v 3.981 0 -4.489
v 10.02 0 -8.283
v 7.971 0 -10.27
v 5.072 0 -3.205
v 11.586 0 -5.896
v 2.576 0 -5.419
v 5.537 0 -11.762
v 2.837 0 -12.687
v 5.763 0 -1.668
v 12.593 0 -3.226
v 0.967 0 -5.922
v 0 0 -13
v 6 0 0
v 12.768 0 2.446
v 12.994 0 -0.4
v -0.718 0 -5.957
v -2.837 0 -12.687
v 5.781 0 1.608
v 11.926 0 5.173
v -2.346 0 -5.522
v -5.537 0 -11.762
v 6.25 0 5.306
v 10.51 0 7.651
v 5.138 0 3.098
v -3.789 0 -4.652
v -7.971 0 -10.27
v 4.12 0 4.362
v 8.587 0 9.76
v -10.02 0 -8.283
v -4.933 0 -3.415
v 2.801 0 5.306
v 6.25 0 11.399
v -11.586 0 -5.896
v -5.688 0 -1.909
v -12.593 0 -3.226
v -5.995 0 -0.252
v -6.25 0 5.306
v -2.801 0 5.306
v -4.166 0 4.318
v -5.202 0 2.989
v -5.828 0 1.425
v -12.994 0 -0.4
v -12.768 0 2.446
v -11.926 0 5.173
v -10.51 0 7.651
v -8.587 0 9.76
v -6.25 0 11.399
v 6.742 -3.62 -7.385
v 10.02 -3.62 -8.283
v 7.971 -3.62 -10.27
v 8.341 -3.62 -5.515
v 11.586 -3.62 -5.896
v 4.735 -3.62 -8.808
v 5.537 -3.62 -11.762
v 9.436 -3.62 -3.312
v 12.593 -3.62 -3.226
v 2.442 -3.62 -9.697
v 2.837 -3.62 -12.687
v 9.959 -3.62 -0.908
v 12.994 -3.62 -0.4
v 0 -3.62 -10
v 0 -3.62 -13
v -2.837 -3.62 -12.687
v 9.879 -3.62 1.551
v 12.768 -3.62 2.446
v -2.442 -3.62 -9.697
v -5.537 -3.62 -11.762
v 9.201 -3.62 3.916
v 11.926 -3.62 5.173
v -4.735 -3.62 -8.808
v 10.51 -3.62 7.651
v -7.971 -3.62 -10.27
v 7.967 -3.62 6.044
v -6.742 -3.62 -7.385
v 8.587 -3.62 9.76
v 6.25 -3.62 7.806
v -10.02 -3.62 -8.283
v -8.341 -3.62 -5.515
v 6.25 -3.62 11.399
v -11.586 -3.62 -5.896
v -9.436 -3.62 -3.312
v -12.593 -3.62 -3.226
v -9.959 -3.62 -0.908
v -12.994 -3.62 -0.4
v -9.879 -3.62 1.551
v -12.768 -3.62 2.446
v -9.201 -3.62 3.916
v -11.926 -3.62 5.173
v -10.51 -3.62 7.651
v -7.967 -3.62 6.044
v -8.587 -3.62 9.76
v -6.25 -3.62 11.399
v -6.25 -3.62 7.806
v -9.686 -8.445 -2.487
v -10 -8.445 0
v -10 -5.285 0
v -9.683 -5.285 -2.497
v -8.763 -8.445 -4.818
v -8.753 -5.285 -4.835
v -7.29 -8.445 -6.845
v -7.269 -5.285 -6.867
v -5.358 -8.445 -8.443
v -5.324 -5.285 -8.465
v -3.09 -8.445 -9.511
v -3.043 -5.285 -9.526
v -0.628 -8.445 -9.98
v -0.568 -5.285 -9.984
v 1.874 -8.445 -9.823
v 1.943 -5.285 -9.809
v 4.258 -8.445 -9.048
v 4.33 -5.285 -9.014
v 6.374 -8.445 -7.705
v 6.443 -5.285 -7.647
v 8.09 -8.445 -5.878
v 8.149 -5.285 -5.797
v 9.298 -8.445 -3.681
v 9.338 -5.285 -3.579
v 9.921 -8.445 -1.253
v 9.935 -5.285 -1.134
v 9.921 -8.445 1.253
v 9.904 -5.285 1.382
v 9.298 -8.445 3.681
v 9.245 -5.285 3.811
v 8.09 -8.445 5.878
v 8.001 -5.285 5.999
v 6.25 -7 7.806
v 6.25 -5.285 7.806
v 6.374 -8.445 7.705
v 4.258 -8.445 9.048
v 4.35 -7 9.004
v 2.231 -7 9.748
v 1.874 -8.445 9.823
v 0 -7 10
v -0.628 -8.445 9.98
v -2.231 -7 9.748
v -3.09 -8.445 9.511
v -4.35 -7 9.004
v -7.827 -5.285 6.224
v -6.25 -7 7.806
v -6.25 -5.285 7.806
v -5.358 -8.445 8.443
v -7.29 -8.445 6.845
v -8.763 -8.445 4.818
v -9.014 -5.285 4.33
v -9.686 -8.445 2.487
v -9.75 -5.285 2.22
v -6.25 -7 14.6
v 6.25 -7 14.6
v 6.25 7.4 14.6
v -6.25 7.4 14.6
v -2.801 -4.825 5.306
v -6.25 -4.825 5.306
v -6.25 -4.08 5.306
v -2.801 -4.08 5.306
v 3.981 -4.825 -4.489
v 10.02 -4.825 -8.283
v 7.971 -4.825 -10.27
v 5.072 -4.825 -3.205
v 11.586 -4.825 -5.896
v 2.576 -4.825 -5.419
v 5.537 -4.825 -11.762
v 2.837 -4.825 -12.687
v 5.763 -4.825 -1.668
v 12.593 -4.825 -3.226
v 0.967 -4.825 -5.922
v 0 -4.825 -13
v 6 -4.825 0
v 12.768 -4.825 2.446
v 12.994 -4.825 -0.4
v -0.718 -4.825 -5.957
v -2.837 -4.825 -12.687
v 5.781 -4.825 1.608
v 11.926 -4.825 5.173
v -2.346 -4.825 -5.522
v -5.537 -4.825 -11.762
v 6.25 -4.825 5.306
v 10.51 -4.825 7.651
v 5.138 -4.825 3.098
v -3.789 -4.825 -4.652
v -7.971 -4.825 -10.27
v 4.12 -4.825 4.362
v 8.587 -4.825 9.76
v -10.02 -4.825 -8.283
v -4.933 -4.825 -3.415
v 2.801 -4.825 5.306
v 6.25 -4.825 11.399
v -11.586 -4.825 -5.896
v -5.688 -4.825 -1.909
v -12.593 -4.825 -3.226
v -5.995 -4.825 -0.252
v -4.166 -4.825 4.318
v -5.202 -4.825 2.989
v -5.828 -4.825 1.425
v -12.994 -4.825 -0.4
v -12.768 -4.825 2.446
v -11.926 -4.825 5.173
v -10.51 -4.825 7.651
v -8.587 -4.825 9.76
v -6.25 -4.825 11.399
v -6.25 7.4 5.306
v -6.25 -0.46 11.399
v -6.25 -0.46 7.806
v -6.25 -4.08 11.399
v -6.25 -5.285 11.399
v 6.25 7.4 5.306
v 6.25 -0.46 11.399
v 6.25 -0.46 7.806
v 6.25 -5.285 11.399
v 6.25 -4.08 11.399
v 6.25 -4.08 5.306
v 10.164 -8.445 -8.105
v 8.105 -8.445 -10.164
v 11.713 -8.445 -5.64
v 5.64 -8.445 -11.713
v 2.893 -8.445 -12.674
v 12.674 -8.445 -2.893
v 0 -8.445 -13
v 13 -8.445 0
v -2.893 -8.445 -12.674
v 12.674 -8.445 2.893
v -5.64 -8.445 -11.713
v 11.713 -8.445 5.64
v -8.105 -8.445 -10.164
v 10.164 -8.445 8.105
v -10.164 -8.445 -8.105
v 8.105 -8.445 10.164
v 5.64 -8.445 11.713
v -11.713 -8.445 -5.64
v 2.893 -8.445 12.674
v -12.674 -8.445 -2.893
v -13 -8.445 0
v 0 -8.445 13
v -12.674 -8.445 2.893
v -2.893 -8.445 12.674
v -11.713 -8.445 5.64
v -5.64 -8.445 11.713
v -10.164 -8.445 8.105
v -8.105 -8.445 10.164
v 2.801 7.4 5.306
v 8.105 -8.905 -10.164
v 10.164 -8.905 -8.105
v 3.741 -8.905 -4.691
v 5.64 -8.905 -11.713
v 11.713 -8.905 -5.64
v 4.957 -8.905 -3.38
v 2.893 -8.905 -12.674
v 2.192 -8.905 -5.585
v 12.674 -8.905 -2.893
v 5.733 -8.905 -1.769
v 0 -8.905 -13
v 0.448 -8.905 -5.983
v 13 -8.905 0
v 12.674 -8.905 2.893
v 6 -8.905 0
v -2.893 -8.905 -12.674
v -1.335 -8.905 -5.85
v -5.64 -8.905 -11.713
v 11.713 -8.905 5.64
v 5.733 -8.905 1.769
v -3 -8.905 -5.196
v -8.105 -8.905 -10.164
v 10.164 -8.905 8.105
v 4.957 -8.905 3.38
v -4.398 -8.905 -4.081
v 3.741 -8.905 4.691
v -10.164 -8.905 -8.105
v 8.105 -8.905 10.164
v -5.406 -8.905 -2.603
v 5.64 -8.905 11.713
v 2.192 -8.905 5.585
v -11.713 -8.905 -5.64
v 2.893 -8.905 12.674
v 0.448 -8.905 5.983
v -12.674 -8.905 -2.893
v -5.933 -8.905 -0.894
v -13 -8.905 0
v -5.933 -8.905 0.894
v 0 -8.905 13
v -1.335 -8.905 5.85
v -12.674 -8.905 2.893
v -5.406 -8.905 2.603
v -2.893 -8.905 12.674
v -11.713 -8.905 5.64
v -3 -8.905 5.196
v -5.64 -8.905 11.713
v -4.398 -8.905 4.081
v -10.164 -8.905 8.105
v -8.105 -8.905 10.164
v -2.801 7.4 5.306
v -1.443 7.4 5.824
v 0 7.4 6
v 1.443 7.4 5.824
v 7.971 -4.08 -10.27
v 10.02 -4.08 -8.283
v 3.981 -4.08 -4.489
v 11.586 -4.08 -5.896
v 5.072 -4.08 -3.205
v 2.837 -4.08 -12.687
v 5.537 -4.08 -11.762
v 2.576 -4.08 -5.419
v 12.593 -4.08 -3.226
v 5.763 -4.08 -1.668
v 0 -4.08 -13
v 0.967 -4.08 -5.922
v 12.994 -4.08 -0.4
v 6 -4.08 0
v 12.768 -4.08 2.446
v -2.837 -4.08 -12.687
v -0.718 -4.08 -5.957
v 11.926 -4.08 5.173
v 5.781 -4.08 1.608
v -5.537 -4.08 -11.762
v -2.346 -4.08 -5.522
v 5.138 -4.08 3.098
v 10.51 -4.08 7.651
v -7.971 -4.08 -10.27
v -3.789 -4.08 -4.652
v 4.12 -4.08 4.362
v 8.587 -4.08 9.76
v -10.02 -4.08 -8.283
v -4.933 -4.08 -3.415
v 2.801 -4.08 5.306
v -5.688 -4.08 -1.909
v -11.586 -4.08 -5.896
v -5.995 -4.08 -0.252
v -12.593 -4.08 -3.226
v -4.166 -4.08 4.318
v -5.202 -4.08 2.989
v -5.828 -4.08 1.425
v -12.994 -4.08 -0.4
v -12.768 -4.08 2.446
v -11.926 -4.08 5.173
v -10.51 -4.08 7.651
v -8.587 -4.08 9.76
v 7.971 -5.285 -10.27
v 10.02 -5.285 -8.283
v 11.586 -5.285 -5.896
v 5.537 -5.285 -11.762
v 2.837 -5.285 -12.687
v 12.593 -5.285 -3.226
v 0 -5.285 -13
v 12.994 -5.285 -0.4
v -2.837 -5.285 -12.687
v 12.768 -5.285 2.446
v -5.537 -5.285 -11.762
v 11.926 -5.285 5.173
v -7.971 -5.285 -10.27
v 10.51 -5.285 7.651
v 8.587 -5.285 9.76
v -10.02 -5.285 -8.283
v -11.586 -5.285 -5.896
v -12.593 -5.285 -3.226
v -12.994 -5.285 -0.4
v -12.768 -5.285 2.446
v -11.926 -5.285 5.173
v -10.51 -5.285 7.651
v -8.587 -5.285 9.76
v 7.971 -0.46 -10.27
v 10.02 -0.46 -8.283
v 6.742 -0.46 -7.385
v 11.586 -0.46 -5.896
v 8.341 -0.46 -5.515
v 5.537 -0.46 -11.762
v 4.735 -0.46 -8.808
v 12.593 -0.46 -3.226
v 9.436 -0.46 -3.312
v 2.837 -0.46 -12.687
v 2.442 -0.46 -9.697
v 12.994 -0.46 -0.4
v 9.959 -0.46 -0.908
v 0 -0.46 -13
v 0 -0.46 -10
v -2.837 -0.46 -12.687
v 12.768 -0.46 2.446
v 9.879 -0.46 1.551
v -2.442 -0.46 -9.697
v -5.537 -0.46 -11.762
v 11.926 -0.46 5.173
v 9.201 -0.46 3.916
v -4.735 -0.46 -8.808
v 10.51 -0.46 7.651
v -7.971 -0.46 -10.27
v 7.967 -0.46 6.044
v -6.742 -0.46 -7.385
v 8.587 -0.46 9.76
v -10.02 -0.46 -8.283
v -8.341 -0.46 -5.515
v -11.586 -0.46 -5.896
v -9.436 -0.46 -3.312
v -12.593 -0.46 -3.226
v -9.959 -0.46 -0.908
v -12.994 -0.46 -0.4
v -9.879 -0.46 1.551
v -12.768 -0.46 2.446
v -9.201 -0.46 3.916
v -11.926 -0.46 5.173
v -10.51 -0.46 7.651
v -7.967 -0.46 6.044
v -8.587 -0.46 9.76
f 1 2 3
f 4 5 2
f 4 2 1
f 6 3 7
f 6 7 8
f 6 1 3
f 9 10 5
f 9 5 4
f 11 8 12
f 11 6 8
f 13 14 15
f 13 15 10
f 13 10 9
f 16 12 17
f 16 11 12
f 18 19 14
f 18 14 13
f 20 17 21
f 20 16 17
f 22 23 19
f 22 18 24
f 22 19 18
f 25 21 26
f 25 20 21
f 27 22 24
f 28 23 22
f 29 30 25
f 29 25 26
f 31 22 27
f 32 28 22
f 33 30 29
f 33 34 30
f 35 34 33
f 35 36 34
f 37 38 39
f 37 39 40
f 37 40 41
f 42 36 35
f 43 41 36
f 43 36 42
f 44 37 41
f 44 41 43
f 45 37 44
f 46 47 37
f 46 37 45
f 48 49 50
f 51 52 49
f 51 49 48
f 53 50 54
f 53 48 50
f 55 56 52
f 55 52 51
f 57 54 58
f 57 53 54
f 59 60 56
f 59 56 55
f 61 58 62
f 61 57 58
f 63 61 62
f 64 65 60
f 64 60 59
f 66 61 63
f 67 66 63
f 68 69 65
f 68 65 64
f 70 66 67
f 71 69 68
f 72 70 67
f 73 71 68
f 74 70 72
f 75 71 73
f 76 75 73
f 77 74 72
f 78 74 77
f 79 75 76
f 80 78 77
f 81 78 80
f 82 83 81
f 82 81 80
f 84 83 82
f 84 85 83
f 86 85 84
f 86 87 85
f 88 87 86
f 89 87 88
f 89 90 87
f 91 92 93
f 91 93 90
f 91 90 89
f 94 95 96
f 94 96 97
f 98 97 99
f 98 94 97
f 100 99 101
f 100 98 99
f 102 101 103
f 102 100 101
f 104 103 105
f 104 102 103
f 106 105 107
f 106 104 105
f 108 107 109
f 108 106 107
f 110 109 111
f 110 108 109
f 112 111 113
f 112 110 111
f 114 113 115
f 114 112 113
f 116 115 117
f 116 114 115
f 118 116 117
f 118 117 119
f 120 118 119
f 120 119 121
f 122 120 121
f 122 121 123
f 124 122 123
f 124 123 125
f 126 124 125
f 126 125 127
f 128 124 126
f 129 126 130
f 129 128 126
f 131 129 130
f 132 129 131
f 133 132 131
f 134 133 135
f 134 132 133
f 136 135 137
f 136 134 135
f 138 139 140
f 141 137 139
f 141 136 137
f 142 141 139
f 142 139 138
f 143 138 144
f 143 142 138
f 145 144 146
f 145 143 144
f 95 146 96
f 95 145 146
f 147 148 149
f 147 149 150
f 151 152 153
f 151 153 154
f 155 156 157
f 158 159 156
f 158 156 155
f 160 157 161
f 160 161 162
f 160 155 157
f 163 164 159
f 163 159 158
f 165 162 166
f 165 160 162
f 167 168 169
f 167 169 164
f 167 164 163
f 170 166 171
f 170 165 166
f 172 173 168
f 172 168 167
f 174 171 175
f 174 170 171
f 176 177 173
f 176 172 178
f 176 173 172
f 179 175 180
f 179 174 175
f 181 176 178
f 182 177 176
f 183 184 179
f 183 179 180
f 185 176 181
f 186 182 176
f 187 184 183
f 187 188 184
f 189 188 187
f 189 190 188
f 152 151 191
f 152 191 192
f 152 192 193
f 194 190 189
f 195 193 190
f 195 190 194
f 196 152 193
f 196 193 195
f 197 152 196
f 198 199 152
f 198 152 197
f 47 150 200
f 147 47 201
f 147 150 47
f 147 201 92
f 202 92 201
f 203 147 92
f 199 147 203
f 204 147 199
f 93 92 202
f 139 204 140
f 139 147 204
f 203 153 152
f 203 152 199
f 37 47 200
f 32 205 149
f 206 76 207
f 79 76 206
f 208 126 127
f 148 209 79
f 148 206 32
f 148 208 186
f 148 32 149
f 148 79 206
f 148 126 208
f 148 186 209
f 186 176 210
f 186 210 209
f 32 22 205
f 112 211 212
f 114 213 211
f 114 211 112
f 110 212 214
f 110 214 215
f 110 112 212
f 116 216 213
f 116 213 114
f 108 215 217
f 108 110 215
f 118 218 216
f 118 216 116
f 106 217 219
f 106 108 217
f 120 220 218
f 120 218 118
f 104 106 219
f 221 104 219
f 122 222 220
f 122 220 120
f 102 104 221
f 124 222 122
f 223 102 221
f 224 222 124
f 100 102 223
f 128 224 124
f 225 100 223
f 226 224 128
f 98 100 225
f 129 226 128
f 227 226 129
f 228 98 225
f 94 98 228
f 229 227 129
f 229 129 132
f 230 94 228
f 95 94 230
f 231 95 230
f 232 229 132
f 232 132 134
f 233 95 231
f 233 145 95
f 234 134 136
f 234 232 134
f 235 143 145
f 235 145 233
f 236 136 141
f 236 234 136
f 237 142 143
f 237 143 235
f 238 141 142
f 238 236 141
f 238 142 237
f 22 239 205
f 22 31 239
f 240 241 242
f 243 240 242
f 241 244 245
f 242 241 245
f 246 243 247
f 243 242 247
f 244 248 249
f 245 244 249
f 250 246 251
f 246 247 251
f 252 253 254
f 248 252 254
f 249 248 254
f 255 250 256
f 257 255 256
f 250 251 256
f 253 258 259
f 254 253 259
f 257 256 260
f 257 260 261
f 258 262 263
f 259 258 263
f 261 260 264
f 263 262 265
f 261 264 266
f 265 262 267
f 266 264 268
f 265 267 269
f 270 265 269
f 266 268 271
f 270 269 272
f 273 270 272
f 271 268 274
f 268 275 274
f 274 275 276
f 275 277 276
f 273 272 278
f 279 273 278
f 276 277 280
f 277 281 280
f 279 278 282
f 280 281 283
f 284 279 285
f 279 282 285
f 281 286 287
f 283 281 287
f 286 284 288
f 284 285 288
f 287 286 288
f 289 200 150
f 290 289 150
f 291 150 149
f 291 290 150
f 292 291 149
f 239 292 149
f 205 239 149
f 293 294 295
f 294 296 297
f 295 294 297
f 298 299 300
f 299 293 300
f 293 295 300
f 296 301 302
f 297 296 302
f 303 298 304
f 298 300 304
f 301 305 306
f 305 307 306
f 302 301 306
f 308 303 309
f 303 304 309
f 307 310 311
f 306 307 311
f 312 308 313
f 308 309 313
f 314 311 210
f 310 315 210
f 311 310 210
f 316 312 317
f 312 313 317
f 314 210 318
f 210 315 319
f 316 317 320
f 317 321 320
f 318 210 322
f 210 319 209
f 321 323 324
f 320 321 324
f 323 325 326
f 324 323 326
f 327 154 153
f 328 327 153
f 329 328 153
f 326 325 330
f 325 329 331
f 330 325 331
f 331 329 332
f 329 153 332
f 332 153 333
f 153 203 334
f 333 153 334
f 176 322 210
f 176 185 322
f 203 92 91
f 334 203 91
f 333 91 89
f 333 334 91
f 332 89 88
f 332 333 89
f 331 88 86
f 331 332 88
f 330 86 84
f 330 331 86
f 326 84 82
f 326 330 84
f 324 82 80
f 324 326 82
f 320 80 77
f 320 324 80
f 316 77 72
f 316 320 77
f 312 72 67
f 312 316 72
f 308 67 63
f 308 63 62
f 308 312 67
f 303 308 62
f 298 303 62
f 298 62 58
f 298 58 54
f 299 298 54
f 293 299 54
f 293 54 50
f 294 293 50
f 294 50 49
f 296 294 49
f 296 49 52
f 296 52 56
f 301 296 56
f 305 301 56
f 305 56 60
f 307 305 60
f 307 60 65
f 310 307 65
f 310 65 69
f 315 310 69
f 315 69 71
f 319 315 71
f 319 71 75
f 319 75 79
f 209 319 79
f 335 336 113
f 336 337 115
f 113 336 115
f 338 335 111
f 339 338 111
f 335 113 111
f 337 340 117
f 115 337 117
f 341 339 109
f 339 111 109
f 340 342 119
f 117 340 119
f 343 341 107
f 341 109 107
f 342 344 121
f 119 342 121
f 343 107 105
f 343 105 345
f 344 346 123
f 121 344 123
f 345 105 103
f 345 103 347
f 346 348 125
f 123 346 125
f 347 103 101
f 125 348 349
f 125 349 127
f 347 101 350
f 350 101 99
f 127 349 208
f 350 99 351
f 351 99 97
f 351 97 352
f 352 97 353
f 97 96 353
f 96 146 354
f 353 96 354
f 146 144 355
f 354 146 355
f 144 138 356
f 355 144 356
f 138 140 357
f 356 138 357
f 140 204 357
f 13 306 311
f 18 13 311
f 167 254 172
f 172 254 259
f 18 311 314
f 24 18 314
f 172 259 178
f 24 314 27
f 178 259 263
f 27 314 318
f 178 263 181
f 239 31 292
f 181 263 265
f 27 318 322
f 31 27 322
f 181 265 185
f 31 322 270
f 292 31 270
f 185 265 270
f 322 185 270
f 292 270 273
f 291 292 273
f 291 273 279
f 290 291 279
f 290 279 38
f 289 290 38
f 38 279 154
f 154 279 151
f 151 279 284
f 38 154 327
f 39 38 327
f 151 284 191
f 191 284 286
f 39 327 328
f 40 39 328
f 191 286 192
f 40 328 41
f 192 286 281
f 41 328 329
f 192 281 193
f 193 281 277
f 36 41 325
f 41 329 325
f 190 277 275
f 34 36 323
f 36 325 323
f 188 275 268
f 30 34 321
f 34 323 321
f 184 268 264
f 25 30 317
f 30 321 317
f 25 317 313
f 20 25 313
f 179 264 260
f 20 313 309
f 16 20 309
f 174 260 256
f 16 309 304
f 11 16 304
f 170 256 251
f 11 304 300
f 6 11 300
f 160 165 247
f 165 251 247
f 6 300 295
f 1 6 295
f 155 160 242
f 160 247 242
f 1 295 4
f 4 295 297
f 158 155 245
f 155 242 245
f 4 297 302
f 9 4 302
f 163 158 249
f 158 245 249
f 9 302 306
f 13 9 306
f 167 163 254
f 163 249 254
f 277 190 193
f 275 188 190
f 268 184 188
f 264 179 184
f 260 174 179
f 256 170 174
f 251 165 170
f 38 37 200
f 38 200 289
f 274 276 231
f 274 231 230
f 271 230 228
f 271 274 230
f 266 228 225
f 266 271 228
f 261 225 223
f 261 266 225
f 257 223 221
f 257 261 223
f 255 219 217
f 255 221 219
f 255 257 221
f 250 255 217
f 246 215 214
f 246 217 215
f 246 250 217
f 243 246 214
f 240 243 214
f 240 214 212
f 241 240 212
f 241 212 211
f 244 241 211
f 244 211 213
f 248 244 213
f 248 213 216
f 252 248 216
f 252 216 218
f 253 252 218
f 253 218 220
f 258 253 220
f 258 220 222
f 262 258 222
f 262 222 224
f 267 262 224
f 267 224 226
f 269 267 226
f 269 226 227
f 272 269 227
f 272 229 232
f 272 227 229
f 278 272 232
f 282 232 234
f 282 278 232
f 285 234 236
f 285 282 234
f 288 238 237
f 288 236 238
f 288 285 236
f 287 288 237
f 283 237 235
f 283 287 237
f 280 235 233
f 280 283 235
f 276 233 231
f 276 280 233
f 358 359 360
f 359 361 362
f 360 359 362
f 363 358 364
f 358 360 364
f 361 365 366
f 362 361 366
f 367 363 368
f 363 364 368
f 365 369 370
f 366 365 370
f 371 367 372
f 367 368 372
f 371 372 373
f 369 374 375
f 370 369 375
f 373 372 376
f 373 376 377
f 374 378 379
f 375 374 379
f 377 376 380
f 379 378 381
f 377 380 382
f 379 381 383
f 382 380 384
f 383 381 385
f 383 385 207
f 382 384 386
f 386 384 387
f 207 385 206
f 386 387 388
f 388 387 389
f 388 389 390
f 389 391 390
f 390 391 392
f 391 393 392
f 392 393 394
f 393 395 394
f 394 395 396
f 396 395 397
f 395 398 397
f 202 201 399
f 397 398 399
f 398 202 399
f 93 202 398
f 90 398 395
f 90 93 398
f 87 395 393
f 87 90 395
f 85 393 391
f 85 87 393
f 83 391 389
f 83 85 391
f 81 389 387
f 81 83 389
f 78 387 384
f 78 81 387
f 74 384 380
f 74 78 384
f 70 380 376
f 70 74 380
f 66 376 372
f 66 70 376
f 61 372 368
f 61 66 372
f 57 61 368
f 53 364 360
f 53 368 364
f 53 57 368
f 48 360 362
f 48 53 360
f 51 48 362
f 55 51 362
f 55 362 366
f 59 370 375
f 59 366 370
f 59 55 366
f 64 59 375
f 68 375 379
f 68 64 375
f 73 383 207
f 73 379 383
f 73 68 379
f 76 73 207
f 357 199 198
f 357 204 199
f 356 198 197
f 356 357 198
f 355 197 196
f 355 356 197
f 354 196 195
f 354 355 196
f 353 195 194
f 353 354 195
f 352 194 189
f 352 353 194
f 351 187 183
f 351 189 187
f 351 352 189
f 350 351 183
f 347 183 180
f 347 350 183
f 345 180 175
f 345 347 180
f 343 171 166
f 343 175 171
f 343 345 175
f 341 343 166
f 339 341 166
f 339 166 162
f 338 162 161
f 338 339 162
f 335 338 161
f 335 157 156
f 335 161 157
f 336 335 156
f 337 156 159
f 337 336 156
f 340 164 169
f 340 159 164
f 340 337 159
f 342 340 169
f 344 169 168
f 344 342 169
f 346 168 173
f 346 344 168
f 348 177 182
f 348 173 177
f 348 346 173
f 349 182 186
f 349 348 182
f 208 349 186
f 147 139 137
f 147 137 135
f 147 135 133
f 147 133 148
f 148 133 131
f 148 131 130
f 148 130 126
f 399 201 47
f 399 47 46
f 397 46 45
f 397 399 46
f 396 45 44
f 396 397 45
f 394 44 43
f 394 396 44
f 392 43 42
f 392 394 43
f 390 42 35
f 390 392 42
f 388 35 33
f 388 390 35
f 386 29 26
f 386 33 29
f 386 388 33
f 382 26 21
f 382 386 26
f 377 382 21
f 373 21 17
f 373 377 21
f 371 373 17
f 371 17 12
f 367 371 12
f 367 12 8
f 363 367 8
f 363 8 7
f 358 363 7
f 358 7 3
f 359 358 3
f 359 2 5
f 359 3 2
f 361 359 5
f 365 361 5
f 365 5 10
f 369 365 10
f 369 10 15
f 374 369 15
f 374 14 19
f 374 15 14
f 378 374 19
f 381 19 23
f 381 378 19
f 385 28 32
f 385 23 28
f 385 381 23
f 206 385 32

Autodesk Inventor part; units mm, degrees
ref_plane "YZ Plane" through (0, 0, 0) normal (1, 0, 0) x (0, 1, 0)
ref_plane "XZ Plane" through (0, 0, 0) normal (0, 1, 0) x (-1, 0, 0)
ref_plane "XY Plane" through (0, 0, 0) normal (0, 0, 1) x (1, 0, 0)
sketch "Skizze1" plane through (0, 0, 0) normal (0, 0, 1) x (1, 0, 0)
  line L0 (0, 0) -> (-13, 0)
  line L1 (-13, 0) -> (-13, -0.46)
  line L2 (-13, -0.46) -> (-10, -0.46)
  line L3 (-10, -0.46) -> (-10, -3.62)
  line L4 (-10, -3.62) -> (-13, -3.62)
  line L5 (-13, -3.62) -> (-13, -4.08)
  line L6 (-13, -4.08) -> (0, -4.08)
  line L7 (0, -4.08) -> (0, 0)
  line L8 (0, -4.825) -> (-13, -4.825)
  line L9 (-13, -4.825) -> (-13, -5.285)
  line L10 (-13, -5.285) -> (-10, -5.285)
  line L11 (-10, -5.285) -> (-10, -8.445)
  line L12 (-10, -8.445) -> (-13, -8.445)
  line L13 (-13, -8.445) -> (-13, -8.905)
  line L14 (-13, -8.905) -> (0, -8.905)
  line L15 (0, -8.905) -> (0, -4.825)
  dimension "d0" = 13
  dimension "d1" = 0.46
  dimension "d2" = 3
  dimension "d3" = 3.16
  dimension "d4" = 0.46
  dimension "d7" = 4.825
revolve "Umdrehung1" add sketch "Skizze1" angle 360 about axis through (0, -8.905, 0) along (0, 1, 0)
sketch "Skizze2" plane through (0, 0, 0) normal (0, 1, 0) x (1, 0, 0)
  line L0 (6.25, -14.6) -> (-6.25, -14.6)
  line L1 (-6.25, -14.6) -> (-6.25, -5.3061)
  line L2 (-6.25, -5.3061) -> (6.25, -5.3061)
  line L3 (6.25, -5.3061) -> (6.25, -14.6)
  line L4 (6.25, -14.6) -> (-6.25, -5.3061) construction
  line L5 (-6.25, -14.6) -> (6.25, -5.3061) construction
  point P0 (0, 0)
  point P1 (0, -9.9531)
  dimension "d13" = 12.5
  dimension "d14" = 14.6
extrude "Extrusion1" add sketch "Skizze2" along normal blind 7.4 and the other way blind 7
sketch "Skizze3" plane through (0, -8.905, 0) normal (0, -1, 0) x (1, 0, 0)
  circle A0 centre (0, 0) radius 13 projected
  circle A1 centre (0, 0) radius 6
  dimension "d19" = 12
extrude "Extrusion2" cut sketch "Skizze3" against normal through all contours A1
properties part number "50_ETL_28by_coil"
